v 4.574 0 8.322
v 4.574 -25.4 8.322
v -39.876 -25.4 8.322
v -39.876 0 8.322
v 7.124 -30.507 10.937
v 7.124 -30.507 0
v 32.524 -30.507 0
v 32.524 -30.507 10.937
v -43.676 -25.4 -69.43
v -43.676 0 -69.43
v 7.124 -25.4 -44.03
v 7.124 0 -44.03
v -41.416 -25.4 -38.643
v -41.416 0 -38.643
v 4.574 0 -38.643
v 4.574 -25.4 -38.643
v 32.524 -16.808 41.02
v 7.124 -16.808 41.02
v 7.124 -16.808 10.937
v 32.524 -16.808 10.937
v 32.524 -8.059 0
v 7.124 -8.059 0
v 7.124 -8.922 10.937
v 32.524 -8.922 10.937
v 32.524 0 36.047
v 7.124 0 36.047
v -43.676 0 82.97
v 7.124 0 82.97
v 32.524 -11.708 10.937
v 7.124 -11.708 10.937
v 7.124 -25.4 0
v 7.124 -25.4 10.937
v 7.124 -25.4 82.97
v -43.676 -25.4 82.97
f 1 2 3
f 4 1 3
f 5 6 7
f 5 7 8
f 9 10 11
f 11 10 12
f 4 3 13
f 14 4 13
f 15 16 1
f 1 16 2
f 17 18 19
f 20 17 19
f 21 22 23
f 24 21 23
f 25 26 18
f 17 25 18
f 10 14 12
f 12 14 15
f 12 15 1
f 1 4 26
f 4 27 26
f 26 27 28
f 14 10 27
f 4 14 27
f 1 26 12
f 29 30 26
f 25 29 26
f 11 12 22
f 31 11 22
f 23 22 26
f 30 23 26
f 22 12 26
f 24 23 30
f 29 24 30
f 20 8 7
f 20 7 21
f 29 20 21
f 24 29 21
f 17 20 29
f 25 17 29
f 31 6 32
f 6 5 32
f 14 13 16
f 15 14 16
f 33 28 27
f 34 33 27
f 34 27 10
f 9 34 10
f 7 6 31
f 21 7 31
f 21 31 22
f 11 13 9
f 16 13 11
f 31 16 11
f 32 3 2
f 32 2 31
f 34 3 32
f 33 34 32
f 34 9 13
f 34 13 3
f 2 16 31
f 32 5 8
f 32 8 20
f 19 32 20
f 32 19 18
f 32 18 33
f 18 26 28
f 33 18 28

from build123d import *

# Parameters (mm, degrees)
F2_DEPTH = 25.4
F3_W     = 13.6997364461
F3_H     = 10.9366187826
F4_DEPTH = 25.4
F7_DEPTH = 50.8


with BuildPart() as f2:
    # F0 (on Front) → F2 (new body)
    with BuildSketch(Plane.XZ):
        Polygon((-43.6756652357, 82.9696333554), (-43.6756652357, -69.4303666446), (7.1243347643, -44.0303666446), (7.1243347643, 82.9696333554), align=None)
    extrude(amount=F2_DEPTH)

    # F3 (on face) → F4 (join)
    with BuildSketch(Plane.YZ.offset(7.1243347643)):
        Polygon((-8.0585619435, 0), (-8.9219789952, 10.9366187826), (-11.7082890579, 10.9366187826), (-16.8076753616, 0), align=None)
        Polygon((-16.8076753616, 0), (-11.7082890579, 10.9366187826), (-16.8076753616, 10.9366187826), align=None)
        Polygon((-16.8076753616, 10.9366187826), (-11.7082890579, 10.9366187826), (0, 36.0473059118), (-16.8076753616, 41.0203114152), align=None)
        with Locations((-23.6575435847, 5.4683093913)):
            Rectangle(F3_W, F3_H)
    extrude(amount=F4_DEPTH)

    # F6 (on face) → F7 (cut)
    with BuildSketch(Plane.XZ.offset(25.4)):
        Polygon((4.574265326, 8.322226192), (-39.875734674, 8.322226192), (-41.4155621324, -38.6425375293), (4.574265326, -38.6425375293), align=None)
    extrude(amount=-F7_DEPTH, mode=Mode.SUBTRACT)


solid = f2.part
